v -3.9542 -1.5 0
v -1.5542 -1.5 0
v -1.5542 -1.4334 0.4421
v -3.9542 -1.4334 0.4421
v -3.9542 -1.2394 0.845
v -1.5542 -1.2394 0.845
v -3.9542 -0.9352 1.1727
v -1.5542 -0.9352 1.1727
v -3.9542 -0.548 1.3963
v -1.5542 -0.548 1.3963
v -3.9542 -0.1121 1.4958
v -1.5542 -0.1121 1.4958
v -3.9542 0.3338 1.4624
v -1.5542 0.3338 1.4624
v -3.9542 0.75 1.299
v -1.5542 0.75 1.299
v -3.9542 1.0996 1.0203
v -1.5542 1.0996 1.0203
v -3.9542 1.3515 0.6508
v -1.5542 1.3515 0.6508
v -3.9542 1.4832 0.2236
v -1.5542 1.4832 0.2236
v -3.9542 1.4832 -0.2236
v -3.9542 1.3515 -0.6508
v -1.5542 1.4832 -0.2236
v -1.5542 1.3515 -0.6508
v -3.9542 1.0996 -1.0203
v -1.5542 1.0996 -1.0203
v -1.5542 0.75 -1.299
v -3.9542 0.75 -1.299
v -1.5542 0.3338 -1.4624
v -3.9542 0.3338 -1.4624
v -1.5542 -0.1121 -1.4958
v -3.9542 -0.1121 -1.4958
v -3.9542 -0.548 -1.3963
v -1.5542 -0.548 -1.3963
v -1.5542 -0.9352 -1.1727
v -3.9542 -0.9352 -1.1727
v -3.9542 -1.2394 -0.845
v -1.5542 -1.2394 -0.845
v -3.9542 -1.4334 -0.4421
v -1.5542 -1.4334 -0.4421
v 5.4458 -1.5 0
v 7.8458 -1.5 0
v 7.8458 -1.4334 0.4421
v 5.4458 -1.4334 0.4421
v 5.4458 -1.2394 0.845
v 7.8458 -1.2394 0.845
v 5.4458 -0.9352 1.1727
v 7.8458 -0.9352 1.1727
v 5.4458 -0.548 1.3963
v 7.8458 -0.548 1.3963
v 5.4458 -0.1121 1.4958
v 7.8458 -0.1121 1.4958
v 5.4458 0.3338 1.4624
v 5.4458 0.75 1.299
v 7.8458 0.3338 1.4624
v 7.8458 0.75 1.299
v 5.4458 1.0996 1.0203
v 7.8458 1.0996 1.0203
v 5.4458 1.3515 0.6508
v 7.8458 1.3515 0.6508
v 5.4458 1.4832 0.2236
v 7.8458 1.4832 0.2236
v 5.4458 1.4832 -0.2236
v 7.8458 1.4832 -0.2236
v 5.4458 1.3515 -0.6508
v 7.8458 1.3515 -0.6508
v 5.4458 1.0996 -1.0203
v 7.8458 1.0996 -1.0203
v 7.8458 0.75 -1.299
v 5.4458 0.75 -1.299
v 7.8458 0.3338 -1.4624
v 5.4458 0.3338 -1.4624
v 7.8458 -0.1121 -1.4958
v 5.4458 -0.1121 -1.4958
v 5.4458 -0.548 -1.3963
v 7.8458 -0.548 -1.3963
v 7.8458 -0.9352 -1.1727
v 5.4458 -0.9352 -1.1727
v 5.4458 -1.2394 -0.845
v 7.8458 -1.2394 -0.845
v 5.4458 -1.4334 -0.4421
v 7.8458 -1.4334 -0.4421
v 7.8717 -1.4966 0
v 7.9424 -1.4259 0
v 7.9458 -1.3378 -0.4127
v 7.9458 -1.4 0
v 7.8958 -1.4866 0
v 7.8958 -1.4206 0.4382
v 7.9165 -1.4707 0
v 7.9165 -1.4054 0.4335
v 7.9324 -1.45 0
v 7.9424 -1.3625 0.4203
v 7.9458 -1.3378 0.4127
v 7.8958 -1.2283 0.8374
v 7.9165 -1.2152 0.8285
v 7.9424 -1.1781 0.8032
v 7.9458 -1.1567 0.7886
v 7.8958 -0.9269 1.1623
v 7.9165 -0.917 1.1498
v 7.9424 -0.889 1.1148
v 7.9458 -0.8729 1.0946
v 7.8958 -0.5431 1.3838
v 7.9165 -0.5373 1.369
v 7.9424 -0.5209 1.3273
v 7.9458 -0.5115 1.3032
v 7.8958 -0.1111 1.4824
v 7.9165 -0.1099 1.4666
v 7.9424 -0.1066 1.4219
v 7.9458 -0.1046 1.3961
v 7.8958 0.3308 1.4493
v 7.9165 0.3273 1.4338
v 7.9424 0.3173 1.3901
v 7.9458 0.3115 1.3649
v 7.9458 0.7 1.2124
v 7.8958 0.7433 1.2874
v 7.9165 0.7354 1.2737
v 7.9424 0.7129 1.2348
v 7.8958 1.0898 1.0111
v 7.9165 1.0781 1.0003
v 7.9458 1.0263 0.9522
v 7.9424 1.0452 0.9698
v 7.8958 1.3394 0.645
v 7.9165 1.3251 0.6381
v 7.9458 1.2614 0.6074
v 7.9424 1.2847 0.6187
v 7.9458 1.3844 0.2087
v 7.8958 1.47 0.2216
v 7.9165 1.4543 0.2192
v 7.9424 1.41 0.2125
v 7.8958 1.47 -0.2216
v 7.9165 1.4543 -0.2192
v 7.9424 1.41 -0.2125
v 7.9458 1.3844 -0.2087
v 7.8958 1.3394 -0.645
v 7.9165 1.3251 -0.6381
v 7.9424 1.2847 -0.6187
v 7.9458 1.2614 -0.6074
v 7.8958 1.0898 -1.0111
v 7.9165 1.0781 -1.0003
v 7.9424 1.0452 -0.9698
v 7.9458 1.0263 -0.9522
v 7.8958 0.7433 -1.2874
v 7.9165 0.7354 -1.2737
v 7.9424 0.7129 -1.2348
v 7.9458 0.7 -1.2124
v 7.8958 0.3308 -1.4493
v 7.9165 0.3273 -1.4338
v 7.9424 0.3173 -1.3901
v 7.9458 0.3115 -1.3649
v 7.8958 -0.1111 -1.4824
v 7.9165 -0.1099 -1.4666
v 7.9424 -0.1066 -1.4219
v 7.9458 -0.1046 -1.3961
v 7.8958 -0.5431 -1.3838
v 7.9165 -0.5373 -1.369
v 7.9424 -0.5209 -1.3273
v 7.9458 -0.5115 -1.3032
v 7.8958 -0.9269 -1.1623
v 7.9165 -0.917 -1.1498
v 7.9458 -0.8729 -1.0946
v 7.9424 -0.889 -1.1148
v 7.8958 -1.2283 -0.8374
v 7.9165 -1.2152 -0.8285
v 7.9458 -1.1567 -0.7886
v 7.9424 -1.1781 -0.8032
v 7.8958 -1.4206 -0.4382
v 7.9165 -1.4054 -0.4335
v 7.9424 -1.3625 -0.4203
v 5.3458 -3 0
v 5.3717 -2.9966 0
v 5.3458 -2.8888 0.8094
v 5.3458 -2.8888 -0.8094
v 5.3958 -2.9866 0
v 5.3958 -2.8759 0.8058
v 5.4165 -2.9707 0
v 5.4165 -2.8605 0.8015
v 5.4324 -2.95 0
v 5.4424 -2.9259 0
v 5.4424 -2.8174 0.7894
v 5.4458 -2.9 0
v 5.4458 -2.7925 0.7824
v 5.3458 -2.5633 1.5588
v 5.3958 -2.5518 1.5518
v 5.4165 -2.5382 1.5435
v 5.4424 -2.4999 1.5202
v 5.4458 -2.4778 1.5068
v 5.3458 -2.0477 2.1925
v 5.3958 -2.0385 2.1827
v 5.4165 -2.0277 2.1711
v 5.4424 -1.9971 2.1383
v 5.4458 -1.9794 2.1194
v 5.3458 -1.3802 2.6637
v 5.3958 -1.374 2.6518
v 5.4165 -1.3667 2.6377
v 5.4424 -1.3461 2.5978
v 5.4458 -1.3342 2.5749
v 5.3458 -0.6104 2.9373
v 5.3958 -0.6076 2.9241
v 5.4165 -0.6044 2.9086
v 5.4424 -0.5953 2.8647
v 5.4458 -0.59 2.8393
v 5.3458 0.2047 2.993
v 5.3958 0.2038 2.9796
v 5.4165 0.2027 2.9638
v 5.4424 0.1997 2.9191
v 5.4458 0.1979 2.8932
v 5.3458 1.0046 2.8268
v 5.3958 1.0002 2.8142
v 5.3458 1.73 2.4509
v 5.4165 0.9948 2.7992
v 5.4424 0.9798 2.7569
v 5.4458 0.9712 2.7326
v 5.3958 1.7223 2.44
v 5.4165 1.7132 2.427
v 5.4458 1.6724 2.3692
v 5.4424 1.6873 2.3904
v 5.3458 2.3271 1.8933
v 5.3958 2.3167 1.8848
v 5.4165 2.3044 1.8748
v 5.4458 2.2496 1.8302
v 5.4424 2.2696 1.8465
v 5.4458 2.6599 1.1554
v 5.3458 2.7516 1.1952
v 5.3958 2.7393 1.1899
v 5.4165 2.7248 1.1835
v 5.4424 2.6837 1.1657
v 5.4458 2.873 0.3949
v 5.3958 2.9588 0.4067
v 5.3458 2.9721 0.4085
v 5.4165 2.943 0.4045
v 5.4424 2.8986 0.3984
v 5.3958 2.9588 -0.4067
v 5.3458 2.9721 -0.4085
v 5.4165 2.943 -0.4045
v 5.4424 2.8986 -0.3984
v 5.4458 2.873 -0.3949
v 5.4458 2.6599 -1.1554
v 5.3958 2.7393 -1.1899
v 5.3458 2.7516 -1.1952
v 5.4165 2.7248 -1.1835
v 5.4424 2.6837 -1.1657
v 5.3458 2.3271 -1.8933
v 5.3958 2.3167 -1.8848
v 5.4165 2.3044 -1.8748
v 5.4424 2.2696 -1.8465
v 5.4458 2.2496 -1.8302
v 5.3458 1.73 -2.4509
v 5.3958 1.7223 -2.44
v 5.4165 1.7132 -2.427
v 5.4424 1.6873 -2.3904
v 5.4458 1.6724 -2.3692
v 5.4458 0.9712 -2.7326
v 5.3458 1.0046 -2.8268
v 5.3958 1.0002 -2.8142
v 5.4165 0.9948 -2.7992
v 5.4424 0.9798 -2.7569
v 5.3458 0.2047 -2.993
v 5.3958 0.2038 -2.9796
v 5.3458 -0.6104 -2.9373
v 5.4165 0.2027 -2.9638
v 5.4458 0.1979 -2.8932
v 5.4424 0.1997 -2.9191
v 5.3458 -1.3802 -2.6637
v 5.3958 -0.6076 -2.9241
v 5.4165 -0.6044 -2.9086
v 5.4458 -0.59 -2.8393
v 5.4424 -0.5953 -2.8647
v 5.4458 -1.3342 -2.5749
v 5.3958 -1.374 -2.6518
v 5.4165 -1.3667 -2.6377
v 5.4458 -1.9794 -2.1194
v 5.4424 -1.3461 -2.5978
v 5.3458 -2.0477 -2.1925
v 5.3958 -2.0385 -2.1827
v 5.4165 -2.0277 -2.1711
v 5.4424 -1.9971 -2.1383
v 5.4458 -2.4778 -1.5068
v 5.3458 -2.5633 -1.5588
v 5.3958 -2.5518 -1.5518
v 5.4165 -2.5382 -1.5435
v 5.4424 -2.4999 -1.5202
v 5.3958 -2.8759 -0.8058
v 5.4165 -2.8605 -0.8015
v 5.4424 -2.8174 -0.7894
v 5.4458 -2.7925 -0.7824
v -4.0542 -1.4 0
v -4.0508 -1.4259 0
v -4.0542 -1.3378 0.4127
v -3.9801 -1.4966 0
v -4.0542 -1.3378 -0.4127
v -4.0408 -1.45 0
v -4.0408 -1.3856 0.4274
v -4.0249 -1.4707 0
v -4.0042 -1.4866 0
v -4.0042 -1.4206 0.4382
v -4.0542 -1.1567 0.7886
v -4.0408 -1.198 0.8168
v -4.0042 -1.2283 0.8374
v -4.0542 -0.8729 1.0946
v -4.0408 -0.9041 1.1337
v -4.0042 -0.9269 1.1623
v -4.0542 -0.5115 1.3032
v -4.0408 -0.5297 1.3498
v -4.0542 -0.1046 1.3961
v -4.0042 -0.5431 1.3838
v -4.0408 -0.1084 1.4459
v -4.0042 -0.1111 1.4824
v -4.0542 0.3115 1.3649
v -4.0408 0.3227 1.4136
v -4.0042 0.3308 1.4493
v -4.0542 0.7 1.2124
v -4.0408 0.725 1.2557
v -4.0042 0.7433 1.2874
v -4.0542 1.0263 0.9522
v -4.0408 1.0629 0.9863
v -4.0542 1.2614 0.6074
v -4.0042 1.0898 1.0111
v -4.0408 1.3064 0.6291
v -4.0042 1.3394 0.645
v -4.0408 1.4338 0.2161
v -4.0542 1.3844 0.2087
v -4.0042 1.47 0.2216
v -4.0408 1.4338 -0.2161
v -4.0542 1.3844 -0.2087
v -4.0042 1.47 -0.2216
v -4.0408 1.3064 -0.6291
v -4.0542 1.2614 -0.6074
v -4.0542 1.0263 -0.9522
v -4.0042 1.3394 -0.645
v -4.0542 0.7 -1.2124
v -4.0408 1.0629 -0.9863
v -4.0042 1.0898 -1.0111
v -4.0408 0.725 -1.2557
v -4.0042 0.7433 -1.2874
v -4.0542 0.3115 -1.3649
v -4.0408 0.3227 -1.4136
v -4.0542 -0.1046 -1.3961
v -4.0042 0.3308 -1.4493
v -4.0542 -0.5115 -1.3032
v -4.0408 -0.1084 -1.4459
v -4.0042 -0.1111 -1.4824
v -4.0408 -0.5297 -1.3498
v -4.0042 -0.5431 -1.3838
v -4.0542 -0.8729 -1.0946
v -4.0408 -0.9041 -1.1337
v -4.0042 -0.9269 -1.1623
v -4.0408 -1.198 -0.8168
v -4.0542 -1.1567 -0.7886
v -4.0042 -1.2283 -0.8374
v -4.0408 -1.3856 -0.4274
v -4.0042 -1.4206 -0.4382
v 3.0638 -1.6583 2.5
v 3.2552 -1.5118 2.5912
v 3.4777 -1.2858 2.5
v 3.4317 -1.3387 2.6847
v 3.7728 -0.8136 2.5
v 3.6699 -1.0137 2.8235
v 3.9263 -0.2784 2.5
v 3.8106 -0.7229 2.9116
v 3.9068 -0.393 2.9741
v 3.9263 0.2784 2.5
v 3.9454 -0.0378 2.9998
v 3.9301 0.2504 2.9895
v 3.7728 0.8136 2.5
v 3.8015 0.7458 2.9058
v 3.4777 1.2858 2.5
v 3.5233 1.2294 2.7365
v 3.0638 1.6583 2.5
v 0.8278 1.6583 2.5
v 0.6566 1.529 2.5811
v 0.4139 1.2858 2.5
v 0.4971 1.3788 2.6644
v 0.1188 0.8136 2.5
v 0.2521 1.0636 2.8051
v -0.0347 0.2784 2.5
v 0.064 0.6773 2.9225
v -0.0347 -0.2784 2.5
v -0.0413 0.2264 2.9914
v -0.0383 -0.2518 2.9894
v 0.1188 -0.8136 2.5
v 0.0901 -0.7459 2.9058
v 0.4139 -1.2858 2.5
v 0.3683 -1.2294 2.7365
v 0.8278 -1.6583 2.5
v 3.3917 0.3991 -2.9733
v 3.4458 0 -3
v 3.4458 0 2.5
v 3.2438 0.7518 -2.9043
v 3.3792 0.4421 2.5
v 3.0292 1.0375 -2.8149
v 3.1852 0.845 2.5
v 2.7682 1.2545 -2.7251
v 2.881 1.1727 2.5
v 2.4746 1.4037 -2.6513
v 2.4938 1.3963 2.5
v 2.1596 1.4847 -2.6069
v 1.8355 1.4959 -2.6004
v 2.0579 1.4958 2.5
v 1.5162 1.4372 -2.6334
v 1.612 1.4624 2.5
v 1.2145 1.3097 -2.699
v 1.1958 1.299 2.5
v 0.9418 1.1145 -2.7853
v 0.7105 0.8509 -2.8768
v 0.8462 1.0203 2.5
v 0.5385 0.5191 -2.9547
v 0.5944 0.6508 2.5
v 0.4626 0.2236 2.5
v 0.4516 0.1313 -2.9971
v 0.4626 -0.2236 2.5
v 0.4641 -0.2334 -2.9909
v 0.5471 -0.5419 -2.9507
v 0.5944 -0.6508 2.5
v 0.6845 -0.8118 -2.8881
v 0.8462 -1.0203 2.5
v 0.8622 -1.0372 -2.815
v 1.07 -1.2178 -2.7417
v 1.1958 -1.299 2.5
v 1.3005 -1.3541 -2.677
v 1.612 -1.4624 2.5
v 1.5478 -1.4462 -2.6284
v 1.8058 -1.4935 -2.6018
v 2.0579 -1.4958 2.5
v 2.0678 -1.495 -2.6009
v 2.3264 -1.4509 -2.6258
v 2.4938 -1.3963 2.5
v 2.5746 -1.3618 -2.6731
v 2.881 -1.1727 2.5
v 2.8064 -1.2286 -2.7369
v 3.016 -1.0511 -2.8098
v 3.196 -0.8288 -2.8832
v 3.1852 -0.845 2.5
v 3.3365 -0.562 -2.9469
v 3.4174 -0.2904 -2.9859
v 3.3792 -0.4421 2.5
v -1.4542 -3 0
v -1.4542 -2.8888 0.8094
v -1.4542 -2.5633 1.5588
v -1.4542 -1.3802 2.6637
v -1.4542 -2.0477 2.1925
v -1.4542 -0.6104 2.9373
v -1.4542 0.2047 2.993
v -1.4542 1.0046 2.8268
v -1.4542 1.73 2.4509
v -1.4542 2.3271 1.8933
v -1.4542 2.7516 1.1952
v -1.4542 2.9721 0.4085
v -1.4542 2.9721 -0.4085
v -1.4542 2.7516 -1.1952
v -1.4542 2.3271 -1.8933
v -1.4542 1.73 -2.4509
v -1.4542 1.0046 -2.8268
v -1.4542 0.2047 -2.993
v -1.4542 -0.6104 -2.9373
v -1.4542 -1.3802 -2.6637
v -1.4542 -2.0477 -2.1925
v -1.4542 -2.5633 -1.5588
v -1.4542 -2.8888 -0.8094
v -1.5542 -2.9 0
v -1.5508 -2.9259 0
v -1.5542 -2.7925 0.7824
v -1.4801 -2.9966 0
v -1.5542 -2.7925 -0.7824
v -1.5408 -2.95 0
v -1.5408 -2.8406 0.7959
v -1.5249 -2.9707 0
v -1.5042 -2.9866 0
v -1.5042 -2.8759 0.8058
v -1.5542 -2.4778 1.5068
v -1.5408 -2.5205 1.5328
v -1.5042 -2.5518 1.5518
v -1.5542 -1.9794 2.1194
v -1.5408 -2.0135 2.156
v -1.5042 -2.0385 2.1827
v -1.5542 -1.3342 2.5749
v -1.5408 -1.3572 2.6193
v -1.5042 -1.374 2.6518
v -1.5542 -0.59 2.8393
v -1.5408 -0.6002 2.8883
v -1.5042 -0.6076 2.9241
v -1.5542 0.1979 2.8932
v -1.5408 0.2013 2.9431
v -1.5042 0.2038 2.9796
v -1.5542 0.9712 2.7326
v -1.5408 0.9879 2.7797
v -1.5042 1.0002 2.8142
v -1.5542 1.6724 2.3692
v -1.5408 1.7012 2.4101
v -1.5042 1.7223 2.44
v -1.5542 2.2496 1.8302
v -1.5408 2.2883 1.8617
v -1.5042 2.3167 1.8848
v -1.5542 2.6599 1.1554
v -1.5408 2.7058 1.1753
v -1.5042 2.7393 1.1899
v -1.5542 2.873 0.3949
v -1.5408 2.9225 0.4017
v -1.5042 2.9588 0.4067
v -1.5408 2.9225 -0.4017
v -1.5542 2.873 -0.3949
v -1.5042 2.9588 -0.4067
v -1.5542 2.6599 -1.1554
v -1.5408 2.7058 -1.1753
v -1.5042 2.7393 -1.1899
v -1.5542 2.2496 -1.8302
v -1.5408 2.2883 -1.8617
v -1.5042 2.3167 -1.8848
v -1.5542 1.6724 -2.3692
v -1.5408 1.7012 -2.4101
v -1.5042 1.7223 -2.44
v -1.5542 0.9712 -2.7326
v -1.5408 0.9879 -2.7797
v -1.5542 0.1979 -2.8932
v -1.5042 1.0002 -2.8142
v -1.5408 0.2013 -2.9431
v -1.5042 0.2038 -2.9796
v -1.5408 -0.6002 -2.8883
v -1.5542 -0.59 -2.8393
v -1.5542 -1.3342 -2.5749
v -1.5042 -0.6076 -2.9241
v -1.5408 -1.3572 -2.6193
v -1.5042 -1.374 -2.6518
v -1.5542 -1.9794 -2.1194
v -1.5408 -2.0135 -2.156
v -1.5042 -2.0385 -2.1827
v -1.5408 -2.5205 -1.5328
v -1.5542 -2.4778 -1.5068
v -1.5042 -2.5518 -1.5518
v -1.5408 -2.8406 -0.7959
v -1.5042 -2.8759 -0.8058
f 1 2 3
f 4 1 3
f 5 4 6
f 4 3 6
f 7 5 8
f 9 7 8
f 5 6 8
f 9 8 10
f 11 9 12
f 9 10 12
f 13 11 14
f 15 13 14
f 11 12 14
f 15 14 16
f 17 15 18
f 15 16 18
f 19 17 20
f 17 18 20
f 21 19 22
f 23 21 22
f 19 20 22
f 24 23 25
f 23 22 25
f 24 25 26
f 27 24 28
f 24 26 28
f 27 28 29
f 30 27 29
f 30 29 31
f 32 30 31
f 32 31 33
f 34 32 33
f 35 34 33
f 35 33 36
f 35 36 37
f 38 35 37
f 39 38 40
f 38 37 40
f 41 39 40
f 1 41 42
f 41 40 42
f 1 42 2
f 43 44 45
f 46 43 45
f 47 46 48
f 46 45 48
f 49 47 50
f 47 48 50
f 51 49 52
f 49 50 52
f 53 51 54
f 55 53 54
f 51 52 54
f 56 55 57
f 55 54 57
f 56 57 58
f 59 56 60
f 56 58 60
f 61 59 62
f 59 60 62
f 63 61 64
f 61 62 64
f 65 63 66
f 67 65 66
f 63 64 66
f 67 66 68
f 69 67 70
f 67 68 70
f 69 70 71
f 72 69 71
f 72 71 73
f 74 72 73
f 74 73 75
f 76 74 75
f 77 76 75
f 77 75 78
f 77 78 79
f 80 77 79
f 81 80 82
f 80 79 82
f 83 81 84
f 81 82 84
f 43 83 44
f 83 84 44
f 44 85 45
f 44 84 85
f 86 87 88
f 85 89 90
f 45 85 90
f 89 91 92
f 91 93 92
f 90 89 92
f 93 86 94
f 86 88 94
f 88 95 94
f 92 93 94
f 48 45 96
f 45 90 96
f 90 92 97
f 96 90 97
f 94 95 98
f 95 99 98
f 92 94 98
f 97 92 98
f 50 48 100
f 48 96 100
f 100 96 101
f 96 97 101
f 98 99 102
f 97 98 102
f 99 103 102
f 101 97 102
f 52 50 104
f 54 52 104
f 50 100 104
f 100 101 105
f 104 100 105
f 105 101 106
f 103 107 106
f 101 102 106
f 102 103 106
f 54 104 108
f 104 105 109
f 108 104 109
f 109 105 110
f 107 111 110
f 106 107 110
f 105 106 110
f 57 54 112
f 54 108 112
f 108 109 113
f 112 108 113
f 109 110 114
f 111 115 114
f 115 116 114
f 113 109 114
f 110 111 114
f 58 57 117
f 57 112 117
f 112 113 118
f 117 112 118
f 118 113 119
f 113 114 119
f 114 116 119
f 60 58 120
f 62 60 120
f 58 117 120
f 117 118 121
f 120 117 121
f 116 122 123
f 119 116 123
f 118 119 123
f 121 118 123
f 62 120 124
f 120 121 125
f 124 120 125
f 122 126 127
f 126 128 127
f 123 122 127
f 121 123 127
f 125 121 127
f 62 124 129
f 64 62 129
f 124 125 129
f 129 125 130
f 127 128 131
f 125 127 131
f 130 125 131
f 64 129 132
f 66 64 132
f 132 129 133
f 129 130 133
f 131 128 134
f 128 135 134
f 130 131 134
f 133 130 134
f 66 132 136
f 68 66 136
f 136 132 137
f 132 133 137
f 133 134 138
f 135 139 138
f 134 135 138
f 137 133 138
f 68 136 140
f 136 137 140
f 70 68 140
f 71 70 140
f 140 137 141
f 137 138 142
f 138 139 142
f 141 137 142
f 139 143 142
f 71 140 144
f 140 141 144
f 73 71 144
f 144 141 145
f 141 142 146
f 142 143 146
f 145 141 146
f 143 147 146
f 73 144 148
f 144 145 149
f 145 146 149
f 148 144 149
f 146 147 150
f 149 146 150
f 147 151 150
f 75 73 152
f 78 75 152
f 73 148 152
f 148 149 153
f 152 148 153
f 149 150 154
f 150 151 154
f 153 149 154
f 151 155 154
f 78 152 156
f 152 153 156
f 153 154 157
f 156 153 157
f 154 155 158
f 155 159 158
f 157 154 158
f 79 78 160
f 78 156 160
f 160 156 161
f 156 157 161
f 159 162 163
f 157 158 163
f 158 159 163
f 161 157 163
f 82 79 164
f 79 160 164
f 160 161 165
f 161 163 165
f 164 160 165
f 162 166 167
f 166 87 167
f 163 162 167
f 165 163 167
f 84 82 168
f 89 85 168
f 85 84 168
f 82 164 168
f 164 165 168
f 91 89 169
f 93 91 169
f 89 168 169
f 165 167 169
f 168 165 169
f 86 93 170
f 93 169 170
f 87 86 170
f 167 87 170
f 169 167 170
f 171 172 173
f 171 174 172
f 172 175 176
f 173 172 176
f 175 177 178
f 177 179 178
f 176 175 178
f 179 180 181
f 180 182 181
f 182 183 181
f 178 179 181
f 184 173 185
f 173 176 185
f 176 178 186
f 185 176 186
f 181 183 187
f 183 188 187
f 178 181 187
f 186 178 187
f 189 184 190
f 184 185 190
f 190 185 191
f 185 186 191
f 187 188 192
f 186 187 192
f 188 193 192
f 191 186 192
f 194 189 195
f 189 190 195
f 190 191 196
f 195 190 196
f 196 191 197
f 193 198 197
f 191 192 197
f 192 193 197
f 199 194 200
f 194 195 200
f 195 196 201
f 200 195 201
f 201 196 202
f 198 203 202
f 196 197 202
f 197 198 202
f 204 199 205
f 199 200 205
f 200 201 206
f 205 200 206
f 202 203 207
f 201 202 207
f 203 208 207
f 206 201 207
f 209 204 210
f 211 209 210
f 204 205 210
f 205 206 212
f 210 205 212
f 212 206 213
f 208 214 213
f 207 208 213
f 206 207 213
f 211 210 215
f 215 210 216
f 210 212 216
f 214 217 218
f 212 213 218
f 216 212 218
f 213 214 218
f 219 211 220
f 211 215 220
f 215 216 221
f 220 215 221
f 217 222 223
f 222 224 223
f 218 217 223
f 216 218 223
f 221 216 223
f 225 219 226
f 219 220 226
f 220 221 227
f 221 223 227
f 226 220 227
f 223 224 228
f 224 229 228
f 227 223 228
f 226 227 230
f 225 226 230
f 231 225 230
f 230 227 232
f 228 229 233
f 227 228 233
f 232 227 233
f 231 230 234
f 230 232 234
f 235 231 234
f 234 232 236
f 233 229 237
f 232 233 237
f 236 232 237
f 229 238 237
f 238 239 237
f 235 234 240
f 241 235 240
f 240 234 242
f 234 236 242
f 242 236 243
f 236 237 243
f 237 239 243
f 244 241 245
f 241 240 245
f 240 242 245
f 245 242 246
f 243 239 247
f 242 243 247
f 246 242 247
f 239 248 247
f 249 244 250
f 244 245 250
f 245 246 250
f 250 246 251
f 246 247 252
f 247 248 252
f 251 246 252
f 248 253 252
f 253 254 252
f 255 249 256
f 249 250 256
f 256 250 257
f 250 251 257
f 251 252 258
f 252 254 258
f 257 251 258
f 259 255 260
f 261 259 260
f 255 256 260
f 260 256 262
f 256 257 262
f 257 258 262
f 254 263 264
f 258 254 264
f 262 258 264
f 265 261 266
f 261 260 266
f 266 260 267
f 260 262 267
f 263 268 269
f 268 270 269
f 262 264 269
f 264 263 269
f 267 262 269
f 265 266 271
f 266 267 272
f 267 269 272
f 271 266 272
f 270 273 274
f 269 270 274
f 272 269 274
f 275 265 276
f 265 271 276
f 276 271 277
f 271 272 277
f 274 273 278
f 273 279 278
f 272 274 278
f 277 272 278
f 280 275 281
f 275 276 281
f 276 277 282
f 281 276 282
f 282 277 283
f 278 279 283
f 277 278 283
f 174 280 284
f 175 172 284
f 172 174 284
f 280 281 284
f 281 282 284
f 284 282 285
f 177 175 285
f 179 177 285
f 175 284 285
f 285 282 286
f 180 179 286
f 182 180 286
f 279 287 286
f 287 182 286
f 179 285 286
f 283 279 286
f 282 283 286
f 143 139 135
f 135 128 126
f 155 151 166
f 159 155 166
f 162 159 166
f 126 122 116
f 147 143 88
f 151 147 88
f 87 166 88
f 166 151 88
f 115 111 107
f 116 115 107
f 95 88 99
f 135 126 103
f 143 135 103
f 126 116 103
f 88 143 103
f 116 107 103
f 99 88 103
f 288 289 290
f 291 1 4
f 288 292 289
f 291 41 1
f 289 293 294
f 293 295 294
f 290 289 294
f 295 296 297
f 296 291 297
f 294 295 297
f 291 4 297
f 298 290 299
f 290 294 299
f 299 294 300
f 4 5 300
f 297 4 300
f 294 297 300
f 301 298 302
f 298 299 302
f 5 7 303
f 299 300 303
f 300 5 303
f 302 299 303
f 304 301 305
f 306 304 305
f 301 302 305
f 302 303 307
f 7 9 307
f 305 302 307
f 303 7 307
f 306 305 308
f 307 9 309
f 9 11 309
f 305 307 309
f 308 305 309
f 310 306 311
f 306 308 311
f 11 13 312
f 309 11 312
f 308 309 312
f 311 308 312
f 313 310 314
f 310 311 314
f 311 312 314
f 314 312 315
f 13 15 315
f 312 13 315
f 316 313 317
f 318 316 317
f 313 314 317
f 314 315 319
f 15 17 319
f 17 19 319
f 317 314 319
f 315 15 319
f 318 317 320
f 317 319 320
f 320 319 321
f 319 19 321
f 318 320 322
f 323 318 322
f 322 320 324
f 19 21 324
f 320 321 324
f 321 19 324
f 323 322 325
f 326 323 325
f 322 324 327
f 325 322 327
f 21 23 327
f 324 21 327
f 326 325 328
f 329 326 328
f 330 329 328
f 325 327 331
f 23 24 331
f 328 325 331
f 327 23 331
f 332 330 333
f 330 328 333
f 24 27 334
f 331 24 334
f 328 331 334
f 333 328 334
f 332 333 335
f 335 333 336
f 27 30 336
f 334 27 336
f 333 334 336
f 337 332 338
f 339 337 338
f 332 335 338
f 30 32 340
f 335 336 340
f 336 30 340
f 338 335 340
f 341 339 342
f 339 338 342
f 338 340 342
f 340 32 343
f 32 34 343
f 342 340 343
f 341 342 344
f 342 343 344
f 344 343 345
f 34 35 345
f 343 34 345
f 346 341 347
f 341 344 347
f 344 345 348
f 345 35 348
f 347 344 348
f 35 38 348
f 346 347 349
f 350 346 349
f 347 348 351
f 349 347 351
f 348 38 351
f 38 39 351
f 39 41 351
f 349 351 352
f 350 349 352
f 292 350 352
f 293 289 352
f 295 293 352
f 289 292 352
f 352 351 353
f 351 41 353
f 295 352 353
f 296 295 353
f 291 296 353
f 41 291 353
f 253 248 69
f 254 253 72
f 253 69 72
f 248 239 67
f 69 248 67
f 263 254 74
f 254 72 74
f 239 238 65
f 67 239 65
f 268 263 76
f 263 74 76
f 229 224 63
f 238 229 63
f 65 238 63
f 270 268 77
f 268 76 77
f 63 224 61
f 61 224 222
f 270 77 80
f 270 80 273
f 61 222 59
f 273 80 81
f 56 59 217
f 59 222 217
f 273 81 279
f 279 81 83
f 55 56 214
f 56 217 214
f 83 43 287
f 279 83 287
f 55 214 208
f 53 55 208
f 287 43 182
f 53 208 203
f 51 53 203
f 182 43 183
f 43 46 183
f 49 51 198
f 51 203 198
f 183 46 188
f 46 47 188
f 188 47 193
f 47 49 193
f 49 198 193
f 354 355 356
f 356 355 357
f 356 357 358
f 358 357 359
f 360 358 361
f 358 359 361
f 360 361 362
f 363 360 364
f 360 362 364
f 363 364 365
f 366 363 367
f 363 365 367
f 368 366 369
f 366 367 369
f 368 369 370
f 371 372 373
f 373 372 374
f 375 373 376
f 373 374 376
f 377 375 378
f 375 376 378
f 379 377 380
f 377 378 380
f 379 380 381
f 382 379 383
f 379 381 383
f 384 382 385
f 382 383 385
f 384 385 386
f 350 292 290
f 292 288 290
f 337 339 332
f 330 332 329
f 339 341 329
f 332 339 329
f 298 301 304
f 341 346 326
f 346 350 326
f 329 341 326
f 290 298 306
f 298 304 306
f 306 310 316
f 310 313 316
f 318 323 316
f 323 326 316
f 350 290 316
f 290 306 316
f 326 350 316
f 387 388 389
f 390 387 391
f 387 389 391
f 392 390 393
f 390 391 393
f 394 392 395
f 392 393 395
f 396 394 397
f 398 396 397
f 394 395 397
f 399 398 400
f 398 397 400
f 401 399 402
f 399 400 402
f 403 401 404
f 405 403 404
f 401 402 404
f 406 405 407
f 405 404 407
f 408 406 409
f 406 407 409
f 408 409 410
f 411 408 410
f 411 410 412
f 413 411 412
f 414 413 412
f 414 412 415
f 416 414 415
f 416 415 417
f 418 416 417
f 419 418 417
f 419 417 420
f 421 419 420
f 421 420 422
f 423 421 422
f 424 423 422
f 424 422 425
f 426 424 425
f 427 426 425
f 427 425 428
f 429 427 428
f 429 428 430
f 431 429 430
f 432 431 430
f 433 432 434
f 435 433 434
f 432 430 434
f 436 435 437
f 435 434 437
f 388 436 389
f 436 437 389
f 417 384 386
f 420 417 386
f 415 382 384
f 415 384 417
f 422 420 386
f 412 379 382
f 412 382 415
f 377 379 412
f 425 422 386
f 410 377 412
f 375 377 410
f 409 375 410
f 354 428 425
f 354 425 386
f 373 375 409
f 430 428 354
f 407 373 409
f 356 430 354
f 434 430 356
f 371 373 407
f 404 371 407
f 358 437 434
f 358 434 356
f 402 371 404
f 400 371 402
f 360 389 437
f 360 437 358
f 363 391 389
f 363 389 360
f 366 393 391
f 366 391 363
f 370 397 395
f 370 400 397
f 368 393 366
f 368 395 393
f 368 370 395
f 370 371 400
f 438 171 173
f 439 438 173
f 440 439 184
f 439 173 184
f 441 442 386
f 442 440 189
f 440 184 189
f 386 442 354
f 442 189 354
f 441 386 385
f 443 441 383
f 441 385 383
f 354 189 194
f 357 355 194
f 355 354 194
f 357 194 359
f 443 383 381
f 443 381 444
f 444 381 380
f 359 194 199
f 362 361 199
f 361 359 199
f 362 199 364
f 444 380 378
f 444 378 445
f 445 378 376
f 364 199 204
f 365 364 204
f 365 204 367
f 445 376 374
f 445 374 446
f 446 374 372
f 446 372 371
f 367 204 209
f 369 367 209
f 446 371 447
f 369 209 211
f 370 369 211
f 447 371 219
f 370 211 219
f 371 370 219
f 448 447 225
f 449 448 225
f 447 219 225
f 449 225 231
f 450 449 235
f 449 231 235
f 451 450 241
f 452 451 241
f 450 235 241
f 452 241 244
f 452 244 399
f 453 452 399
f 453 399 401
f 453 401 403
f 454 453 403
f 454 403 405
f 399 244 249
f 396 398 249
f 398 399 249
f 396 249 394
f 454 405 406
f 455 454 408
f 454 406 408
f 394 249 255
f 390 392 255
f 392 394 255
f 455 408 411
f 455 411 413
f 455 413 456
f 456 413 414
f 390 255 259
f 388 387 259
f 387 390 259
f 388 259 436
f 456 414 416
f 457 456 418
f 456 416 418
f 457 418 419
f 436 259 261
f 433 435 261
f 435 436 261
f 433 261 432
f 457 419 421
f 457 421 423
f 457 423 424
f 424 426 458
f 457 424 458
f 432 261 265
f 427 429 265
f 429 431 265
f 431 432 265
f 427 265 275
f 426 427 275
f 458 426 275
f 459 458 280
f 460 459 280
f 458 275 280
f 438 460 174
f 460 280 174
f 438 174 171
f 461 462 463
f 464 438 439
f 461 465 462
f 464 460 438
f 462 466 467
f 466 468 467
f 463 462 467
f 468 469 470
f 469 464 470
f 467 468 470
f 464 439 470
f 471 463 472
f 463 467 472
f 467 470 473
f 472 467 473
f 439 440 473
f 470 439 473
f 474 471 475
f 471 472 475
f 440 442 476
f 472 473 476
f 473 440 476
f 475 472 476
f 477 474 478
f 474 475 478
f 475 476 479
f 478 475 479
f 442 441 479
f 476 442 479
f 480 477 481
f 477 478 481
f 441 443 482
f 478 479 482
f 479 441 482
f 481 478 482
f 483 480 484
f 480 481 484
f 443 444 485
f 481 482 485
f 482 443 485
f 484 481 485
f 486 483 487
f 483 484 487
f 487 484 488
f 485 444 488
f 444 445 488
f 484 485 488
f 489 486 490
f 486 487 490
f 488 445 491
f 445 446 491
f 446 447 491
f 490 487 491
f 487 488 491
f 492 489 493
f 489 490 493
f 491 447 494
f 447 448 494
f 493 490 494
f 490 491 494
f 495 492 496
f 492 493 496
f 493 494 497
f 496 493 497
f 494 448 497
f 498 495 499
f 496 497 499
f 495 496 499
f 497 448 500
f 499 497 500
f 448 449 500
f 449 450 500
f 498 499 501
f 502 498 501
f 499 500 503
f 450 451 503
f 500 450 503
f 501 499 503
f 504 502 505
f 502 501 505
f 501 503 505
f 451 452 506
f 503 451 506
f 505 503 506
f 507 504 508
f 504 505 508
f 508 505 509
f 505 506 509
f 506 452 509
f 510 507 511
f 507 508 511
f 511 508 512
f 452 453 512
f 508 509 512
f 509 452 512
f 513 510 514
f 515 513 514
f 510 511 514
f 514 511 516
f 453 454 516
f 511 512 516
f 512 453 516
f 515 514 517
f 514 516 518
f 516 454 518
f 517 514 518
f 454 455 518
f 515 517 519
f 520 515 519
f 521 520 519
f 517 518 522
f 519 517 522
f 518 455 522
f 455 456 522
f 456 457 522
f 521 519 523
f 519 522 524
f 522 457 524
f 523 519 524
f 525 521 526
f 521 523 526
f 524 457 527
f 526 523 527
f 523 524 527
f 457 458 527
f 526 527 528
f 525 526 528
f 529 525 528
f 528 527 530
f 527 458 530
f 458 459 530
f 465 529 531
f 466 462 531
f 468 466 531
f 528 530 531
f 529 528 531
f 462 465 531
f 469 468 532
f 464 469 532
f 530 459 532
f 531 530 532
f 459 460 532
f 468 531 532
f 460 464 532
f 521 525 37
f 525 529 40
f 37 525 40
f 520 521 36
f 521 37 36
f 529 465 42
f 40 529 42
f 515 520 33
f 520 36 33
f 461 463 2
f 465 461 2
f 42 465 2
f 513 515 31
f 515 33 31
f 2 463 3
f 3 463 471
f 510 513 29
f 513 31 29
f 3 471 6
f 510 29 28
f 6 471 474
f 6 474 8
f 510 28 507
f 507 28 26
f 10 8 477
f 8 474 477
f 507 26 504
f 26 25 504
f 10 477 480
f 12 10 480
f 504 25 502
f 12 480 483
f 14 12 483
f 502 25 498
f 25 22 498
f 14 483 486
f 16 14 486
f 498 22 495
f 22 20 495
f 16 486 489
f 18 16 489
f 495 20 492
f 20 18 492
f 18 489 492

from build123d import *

# Parameters (mm, degrees)
FILLET1_R          = 0.1
SKETCH2_R          = 2
CUT_EXTRUDE1_DEPTH = 0.5
CUT_EXTRUDE2_REACH = 7.5
SKETCH3_R          = 1.5


with BuildPart() as part:
    # Sketch1 → Revolve1 (revolve)
    with BuildSketch(Plane.XY):
        Polygon((0, 0), (-4.054195804, 0), (-4.054195804, -1.5), (-1.554195804, -1.5), (-1.554195804, -3), (5.445804196, -3), (5.445804196, -1.5), (7.945804196, -1.5), (7.945804196, 0), align=None)
    revolve(axis=Axis((7.945804196, 0, 0), (-1, 0, 0)))

    # Fillet1
    fillet1_edges = [part.edges().sort_by_distance(p)[0] for p in [
        (7.945804196, 1.5, 0),
        (5.445804196, 3, 0),
        (-1.554195804, 3, 0),
        (-4.054195804, 1.5, 0),
    ]]
    fillet(fillet1_edges, radius=FILLET1_R)

    # Sketch2 → Cut-Extrude1 (cut)
    with BuildSketch(Plane.XY.offset(3)):
        with Locations((1.945804196, 0)):
            Circle(SKETCH2_R)
    extrude(amount=-CUT_EXTRUDE1_DEPTH, mode=Mode.SUBTRACT)

    # Sketch3 → Cut-Extrude2 (cut, up to next)
    with BuildSketch(Plane.XY.offset(2.5), mode=Mode.PRIVATE) as cut_extrude2_sk1:
        with Locations((1.945804196, 0)):
            Circle(SKETCH3_R)
    cut_extrude2_tool1 = extrude(cut_extrude2_sk1.sketch, amount=-CUT_EXTRUDE2_REACH, mode=Mode.PRIVATE) & part.part
    add(cut_extrude2_tool1.solids().sort_by_distance((1.945804, 0, 2.5))[0], mode=Mode.SUBTRACT)


solid = part.part
